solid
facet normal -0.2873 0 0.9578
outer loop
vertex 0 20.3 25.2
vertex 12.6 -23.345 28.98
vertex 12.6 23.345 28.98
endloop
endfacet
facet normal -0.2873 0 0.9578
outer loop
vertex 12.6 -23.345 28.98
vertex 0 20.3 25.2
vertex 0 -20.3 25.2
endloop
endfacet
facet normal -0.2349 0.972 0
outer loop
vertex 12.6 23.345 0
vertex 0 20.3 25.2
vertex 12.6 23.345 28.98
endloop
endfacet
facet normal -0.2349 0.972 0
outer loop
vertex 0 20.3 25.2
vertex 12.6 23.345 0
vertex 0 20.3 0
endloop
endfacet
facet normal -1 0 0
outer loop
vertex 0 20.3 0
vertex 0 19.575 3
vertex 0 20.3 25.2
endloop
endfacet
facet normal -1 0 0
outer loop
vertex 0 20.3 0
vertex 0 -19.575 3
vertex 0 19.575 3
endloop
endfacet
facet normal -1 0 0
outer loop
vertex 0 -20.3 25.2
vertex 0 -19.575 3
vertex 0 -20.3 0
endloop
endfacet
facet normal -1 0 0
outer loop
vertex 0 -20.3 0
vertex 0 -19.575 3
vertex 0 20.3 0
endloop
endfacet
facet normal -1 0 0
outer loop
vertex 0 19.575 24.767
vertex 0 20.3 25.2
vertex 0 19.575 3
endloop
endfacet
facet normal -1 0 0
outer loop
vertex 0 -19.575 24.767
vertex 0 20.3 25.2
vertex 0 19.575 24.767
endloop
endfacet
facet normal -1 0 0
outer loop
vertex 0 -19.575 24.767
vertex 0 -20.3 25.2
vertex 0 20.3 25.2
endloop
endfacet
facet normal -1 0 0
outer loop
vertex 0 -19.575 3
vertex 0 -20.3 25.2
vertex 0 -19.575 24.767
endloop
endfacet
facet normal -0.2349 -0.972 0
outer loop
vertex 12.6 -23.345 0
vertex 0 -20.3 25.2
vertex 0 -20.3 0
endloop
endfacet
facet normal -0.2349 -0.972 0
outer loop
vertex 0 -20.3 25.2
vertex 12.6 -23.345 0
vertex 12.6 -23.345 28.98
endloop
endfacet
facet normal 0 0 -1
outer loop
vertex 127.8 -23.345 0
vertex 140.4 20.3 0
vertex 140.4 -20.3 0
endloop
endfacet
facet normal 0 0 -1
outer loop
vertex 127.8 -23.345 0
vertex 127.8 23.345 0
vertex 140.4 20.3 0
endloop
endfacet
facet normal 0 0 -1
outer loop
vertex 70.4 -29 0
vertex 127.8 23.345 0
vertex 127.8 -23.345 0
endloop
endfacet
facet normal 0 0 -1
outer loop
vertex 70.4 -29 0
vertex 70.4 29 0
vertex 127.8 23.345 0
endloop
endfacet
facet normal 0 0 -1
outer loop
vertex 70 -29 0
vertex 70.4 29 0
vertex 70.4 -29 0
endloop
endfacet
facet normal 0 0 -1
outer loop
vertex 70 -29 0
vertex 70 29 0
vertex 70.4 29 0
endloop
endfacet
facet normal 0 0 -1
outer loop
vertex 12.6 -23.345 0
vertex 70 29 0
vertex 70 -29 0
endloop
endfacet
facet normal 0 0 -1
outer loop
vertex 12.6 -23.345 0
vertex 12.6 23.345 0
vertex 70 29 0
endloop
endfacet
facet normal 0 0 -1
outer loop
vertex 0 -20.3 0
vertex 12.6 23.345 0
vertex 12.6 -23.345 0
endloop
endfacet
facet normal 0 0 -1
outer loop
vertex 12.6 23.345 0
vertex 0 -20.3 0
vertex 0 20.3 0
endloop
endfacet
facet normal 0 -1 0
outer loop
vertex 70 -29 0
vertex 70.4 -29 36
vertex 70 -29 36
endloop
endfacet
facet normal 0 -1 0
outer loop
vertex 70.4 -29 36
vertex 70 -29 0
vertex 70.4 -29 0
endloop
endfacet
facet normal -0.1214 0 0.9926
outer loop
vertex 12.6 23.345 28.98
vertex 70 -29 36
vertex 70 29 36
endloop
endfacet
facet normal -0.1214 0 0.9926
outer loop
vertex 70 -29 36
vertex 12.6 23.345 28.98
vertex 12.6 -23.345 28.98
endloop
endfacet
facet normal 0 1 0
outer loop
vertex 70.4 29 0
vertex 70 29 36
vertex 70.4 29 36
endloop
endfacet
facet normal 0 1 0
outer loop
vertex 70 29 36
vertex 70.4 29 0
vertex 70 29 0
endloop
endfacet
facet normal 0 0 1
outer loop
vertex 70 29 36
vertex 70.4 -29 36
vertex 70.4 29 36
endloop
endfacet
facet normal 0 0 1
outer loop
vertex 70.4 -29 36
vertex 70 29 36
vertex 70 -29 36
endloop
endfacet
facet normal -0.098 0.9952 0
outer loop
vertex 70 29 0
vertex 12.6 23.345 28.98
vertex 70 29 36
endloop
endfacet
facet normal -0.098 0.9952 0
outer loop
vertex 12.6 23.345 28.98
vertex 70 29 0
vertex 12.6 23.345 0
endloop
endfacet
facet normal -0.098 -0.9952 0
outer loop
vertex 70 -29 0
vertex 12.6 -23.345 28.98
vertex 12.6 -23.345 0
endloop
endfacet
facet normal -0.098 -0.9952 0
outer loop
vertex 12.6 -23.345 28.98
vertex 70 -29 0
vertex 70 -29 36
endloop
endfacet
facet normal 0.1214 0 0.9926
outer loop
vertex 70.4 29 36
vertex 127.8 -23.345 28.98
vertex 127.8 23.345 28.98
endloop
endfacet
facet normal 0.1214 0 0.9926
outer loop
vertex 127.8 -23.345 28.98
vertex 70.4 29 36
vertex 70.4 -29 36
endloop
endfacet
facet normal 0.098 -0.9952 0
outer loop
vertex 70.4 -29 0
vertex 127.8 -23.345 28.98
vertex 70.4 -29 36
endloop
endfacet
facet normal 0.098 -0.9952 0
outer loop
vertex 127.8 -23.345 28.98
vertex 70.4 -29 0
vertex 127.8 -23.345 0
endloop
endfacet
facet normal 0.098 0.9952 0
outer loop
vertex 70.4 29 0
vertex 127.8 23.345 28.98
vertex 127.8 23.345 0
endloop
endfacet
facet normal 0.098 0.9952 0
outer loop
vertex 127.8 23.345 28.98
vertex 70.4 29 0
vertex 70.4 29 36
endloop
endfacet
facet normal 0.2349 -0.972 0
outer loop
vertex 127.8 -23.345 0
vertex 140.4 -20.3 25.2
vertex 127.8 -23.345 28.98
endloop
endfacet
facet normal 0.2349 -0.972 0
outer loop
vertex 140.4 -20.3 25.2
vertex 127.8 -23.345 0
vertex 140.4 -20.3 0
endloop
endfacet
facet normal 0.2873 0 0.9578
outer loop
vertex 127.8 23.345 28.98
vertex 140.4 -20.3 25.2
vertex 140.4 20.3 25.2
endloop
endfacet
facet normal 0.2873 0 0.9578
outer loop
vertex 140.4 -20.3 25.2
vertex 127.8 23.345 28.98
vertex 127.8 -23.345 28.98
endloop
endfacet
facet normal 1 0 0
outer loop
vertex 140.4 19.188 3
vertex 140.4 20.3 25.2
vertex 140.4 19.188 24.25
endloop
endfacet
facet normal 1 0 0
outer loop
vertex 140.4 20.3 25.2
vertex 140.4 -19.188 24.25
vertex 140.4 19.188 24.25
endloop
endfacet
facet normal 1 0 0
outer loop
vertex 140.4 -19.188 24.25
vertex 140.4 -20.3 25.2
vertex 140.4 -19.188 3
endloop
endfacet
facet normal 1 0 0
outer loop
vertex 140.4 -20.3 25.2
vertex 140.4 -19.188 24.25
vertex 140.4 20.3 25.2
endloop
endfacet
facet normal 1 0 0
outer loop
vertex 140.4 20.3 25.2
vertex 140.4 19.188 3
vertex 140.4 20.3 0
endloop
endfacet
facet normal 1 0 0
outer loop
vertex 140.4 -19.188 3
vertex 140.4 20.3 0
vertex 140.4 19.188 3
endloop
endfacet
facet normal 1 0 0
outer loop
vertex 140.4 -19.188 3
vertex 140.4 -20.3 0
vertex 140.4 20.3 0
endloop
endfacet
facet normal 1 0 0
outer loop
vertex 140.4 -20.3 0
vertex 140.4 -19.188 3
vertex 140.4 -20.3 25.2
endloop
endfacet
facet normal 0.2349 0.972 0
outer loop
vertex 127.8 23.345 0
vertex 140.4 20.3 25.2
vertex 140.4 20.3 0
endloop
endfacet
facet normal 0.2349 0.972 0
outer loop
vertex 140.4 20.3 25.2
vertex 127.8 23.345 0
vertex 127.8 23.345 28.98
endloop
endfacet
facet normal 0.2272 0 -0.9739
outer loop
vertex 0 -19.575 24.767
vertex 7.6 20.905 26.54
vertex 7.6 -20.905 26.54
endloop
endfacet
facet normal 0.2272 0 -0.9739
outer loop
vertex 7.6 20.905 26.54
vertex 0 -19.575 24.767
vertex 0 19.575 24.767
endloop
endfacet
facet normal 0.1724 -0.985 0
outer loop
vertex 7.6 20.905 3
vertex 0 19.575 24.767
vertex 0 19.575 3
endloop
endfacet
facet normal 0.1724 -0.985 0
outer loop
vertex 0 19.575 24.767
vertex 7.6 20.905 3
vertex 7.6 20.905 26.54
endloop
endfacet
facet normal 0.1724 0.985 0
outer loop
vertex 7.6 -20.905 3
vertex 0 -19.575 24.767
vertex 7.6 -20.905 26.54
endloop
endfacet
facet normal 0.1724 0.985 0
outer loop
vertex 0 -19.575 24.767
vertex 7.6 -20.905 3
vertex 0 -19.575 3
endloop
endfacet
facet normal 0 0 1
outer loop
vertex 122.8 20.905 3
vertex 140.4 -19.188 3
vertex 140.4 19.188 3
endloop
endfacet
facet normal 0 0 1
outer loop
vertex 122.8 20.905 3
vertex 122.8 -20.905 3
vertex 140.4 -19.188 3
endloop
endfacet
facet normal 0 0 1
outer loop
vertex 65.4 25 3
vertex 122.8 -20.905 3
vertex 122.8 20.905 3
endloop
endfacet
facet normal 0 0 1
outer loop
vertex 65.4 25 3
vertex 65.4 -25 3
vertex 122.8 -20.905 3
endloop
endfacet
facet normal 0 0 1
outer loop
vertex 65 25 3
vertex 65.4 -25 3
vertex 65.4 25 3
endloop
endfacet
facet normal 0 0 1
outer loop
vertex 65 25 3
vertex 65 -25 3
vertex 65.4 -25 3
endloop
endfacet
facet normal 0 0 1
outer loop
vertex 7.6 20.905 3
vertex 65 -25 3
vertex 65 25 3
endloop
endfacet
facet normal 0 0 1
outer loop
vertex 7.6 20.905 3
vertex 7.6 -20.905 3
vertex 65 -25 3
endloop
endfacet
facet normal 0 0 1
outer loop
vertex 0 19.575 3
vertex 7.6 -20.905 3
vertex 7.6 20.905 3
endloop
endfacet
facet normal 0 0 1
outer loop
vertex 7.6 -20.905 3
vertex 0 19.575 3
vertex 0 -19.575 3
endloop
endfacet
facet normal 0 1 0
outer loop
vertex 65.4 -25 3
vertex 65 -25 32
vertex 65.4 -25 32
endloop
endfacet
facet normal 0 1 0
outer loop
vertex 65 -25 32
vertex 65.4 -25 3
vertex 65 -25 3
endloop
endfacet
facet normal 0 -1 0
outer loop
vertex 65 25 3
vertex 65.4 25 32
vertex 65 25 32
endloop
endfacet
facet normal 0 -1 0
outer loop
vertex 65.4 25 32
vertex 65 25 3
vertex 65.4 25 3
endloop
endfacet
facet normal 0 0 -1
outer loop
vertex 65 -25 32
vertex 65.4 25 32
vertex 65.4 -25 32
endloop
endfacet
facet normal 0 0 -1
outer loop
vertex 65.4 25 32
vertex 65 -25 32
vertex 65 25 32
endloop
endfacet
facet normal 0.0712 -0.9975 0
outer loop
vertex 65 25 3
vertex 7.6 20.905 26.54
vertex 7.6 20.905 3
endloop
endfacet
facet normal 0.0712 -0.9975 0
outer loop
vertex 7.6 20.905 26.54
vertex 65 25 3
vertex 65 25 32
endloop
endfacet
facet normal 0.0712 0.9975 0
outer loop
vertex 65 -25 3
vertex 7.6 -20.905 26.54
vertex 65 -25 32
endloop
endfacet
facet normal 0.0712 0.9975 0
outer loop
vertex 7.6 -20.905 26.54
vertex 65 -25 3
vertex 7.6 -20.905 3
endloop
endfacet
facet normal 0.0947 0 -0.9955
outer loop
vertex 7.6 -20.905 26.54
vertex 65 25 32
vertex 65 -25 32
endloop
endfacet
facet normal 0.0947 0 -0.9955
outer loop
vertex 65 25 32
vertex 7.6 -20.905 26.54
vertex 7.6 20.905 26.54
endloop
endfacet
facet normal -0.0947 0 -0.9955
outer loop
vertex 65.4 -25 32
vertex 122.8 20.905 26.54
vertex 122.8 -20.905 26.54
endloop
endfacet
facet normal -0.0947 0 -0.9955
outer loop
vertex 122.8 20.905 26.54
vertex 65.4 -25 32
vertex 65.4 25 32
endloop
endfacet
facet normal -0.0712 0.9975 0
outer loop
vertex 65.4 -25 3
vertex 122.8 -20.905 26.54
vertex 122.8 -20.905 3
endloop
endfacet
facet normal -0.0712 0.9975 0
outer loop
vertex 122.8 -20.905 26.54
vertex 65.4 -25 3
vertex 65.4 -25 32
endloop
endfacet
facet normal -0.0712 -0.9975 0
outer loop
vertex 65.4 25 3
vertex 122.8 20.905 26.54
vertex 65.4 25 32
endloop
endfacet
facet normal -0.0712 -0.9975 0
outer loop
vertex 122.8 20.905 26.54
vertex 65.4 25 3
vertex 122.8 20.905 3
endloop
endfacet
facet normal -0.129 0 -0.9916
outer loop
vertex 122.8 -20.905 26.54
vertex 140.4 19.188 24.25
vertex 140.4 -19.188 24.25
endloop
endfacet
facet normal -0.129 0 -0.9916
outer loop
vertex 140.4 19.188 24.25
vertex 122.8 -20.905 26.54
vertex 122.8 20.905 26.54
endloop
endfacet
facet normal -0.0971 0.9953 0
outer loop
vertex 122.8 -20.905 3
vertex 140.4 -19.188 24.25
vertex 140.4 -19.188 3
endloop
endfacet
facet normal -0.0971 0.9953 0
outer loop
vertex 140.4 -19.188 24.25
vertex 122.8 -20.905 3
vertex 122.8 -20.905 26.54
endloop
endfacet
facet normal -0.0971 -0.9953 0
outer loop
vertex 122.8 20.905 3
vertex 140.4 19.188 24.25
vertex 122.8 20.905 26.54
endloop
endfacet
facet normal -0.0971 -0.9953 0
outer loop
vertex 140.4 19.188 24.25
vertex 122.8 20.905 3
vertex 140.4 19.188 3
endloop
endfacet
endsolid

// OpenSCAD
$fn = 32;

// ----------------------------------------------------------------------
// Faired channel: 140 x 58 x 36 mm, 4 mm walls, faired ends
// ----------------------------------------------------------------------

// --- parameters (mm) ---
length = 140;             // channel length
width = 58;               // channel width at mid length
height = 36;              // channel height at mid length
wall = 4;                 // side wall thickness
floor_t = 3;              // floor thickness
end_w = 40.6;             // faired end width
end_h = 25.2;             // faired end height

difference() {
  union() {
    hull() {
      translate([0, -20.3, 0]) cube([0.4, 40.6, 25.2]);
      translate([12.6, -23.345, 0]) cube([0.4, 46.69, 28.98]);
    }
    hull() {
      translate([12.6, -23.345, 0]) cube([0.4, 46.69, 28.98]);
      translate([70, -29, 0]) cube([0.4, 58, 36]);
    }
    hull() {
      translate([70, -29, 0]) cube([0.4, 58, 36]);
      translate([127.4, -23.345, 0]) cube([0.4, 46.69, 28.98]);
    }
    hull() {
      translate([127.4, -23.345, 0]) cube([0.4, 46.69, 28.98]);
      translate([140, -20.3, 0]) cube([0.4, 40.6, 25.2]);
    }
  }
  /* cavity, 5 mm proud of both ends so the ports are cut clean */
  hull() {
    translate([-5, -18.7, 3]) cube([0.4, 37.4, 20.6]);
    translate([7.6, -20.905, 3]) cube([0.4, 41.81, 23.54]);
  }
  hull() {
    translate([7.6, -20.905, 3]) cube([0.4, 41.81, 23.54]);
    translate([65, -25, 3]) cube([0.4, 50, 29]);
  }
  hull() {
    translate([65, -25, 3]) cube([0.4, 50, 29]);
    translate([122.4, -20.905, 3]) cube([0.4, 41.81, 23.54]);
  }
  hull() {
    translate([122.4, -20.905, 3]) cube([0.4, 41.81, 23.54]);
    translate([145, -18.7, 3]) cube([0.4, 37.4, 20.6]);
  }
}
